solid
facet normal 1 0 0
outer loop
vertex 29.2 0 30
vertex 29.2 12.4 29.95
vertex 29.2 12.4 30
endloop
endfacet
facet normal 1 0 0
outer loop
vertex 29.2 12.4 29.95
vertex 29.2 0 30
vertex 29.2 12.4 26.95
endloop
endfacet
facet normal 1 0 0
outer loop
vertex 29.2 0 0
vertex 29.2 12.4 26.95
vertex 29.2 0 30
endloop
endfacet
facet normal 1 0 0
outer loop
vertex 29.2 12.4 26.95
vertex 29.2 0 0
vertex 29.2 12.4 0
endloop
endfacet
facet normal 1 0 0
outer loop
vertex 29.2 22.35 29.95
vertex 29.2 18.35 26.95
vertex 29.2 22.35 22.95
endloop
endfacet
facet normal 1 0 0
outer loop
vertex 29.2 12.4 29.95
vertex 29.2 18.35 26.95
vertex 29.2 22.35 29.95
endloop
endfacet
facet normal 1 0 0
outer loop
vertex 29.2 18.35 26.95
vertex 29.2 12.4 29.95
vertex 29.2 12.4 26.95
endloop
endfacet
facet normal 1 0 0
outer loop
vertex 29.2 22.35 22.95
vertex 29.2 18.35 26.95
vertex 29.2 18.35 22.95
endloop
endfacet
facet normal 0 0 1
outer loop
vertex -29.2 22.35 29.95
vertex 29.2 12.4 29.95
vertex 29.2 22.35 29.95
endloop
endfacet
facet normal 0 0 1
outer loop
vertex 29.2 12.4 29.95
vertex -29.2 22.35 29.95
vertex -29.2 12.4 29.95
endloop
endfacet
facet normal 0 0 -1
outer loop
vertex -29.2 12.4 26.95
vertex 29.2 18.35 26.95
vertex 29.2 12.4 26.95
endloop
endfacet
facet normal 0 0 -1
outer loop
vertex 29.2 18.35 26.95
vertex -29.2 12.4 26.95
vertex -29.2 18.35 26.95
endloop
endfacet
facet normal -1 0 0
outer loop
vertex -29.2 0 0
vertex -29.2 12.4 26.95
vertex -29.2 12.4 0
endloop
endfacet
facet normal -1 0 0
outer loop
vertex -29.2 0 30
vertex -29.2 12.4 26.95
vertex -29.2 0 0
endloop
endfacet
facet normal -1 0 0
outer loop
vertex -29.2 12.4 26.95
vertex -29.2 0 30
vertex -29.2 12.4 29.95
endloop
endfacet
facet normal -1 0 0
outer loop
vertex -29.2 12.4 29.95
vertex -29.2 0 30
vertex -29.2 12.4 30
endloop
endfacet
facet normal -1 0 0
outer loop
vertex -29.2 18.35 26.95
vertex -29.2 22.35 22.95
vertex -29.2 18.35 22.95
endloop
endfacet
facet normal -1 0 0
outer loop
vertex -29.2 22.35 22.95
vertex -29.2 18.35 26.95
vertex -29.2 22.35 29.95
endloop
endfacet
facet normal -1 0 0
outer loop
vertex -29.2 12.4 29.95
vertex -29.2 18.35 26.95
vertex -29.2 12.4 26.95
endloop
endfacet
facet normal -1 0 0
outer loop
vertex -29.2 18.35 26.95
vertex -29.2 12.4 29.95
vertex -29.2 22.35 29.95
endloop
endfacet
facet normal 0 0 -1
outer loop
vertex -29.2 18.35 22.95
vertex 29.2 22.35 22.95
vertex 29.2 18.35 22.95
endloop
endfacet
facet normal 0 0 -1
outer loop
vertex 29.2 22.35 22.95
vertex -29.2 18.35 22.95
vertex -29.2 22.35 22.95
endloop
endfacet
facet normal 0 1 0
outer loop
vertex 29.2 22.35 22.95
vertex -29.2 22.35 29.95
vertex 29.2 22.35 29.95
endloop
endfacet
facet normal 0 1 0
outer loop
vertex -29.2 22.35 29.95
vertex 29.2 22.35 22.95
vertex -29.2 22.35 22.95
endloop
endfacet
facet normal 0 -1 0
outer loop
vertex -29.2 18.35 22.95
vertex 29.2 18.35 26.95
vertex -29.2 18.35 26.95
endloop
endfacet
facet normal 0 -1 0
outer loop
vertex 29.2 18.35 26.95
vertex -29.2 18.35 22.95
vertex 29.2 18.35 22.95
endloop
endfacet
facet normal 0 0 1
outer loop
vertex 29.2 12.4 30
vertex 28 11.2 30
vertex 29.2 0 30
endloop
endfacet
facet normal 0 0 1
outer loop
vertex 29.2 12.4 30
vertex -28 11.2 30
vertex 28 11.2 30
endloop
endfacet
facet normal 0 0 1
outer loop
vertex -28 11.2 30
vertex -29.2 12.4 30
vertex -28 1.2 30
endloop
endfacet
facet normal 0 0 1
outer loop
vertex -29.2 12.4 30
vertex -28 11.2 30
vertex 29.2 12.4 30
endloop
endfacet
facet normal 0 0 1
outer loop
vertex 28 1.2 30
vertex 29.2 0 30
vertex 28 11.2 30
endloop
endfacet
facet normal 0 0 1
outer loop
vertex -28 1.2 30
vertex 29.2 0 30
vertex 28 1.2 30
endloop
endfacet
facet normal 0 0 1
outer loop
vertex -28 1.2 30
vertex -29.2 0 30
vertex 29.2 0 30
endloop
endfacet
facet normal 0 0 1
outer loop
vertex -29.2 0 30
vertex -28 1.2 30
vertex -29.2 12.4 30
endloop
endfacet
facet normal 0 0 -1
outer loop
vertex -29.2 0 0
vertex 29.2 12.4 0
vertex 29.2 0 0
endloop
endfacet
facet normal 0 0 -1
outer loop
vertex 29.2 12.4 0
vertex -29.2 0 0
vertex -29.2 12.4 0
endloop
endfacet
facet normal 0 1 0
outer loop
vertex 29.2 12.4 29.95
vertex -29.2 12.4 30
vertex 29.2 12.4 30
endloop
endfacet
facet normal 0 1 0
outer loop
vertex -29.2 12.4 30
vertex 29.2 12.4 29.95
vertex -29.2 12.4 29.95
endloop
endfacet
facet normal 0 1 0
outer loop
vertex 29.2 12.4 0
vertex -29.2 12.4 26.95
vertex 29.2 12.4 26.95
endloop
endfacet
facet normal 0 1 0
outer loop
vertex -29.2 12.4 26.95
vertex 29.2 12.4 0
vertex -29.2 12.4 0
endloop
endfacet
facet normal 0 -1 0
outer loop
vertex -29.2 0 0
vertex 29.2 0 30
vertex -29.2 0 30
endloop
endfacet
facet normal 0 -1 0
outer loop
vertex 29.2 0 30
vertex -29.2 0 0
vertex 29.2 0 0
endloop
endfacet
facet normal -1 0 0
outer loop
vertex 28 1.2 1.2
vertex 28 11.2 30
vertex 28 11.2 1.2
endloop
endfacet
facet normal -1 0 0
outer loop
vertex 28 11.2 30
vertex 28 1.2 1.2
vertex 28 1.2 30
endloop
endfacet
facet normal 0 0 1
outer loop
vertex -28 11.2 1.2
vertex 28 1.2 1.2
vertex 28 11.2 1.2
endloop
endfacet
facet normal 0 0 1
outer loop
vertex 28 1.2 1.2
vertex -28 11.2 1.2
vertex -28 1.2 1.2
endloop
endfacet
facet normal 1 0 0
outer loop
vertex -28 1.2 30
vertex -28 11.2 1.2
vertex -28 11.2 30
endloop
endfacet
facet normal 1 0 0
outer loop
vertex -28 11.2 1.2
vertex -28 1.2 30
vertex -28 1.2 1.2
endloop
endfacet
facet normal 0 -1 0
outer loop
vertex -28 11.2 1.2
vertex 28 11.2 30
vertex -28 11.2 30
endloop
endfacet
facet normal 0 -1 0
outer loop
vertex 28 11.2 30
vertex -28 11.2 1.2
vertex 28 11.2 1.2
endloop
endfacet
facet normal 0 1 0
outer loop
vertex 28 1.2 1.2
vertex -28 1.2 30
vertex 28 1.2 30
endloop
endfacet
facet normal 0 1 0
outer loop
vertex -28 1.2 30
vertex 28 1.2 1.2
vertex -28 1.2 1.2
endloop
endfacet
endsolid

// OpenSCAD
// [FL_INDEX: keywords="openscad, 3d_parametric, Holder_for_visit_cards_and_6_mm_plywood_printers, csg_solid" | COT="Parametric OpenSCAD design from 3DCodeverse"]
// Title: Holder for visit cards and 6 mm plywood printers

tol=0.05;
th=1.2; // box wall thickness

ply_th= 6; // plywood thickness
hook_th= 3;
hook_sz= 4; // clamp height
hook_top_len= ply_th + hook_th;

vc_w= 55+1; // width of hole for vcard
vc_th_int= 10; // hole thickness (ie. how many card can be packed into the holder)
vc_th_ext= th + vc_th_int + th;

hook_width_ext=th+vc_w+th;
total_h= 30;

module ccube(size)
{
	translate([-size[0]/2, -size[1]/2, 0])
		cube(size);
}

difference()
{
translate([-hook_width_ext/2,0,0])
	union()
	{
		cube([hook_width_ext, vc_th_ext, total_h]);
		translate([0,vc_th_ext-tol,total_h-hook_th-tol])
		{
			cube([hook_width_ext, hook_top_len, hook_th]);
			translate([0,ply_th,-hook_sz])
				cube([hook_width_ext, hook_sz, hook_sz+hook_th]);
		}
	}

	// Main hole
	translate([-hook_width_ext/2,0,0])
		translate([th,th,th])
			cube([vc_w, vc_th_int, total_h]);
/*
	translate([-hook_width_ext/2+4,0,-10])
		translate([th,th,th])
			cube([vc_w-8, vc_th_int, total_h]);

	translate([0,0,total_h/2])
		carve_hole();
		
	for(dx=[-1,+1])
		for(dz=[-1,+1])
			translate([dx*subhole_dist, 0, dz*subhole_dist+total_h/2])
				scale([0.3,1,0.3])
					carve_hole();
*/
}
subhole_dist=18;

module carve_hole()
{
	translate([0,-1,0])
	{
		rotate([-90,0,0])
		{
			hull()
			{
				scale([1,0.6,1]) cylinder(r=16,h=vc_th_ext+2);
				scale([0.1,1,1]) cylinder(r=23,h=vc_th_ext+2);
			}
		}
	}
	
}
